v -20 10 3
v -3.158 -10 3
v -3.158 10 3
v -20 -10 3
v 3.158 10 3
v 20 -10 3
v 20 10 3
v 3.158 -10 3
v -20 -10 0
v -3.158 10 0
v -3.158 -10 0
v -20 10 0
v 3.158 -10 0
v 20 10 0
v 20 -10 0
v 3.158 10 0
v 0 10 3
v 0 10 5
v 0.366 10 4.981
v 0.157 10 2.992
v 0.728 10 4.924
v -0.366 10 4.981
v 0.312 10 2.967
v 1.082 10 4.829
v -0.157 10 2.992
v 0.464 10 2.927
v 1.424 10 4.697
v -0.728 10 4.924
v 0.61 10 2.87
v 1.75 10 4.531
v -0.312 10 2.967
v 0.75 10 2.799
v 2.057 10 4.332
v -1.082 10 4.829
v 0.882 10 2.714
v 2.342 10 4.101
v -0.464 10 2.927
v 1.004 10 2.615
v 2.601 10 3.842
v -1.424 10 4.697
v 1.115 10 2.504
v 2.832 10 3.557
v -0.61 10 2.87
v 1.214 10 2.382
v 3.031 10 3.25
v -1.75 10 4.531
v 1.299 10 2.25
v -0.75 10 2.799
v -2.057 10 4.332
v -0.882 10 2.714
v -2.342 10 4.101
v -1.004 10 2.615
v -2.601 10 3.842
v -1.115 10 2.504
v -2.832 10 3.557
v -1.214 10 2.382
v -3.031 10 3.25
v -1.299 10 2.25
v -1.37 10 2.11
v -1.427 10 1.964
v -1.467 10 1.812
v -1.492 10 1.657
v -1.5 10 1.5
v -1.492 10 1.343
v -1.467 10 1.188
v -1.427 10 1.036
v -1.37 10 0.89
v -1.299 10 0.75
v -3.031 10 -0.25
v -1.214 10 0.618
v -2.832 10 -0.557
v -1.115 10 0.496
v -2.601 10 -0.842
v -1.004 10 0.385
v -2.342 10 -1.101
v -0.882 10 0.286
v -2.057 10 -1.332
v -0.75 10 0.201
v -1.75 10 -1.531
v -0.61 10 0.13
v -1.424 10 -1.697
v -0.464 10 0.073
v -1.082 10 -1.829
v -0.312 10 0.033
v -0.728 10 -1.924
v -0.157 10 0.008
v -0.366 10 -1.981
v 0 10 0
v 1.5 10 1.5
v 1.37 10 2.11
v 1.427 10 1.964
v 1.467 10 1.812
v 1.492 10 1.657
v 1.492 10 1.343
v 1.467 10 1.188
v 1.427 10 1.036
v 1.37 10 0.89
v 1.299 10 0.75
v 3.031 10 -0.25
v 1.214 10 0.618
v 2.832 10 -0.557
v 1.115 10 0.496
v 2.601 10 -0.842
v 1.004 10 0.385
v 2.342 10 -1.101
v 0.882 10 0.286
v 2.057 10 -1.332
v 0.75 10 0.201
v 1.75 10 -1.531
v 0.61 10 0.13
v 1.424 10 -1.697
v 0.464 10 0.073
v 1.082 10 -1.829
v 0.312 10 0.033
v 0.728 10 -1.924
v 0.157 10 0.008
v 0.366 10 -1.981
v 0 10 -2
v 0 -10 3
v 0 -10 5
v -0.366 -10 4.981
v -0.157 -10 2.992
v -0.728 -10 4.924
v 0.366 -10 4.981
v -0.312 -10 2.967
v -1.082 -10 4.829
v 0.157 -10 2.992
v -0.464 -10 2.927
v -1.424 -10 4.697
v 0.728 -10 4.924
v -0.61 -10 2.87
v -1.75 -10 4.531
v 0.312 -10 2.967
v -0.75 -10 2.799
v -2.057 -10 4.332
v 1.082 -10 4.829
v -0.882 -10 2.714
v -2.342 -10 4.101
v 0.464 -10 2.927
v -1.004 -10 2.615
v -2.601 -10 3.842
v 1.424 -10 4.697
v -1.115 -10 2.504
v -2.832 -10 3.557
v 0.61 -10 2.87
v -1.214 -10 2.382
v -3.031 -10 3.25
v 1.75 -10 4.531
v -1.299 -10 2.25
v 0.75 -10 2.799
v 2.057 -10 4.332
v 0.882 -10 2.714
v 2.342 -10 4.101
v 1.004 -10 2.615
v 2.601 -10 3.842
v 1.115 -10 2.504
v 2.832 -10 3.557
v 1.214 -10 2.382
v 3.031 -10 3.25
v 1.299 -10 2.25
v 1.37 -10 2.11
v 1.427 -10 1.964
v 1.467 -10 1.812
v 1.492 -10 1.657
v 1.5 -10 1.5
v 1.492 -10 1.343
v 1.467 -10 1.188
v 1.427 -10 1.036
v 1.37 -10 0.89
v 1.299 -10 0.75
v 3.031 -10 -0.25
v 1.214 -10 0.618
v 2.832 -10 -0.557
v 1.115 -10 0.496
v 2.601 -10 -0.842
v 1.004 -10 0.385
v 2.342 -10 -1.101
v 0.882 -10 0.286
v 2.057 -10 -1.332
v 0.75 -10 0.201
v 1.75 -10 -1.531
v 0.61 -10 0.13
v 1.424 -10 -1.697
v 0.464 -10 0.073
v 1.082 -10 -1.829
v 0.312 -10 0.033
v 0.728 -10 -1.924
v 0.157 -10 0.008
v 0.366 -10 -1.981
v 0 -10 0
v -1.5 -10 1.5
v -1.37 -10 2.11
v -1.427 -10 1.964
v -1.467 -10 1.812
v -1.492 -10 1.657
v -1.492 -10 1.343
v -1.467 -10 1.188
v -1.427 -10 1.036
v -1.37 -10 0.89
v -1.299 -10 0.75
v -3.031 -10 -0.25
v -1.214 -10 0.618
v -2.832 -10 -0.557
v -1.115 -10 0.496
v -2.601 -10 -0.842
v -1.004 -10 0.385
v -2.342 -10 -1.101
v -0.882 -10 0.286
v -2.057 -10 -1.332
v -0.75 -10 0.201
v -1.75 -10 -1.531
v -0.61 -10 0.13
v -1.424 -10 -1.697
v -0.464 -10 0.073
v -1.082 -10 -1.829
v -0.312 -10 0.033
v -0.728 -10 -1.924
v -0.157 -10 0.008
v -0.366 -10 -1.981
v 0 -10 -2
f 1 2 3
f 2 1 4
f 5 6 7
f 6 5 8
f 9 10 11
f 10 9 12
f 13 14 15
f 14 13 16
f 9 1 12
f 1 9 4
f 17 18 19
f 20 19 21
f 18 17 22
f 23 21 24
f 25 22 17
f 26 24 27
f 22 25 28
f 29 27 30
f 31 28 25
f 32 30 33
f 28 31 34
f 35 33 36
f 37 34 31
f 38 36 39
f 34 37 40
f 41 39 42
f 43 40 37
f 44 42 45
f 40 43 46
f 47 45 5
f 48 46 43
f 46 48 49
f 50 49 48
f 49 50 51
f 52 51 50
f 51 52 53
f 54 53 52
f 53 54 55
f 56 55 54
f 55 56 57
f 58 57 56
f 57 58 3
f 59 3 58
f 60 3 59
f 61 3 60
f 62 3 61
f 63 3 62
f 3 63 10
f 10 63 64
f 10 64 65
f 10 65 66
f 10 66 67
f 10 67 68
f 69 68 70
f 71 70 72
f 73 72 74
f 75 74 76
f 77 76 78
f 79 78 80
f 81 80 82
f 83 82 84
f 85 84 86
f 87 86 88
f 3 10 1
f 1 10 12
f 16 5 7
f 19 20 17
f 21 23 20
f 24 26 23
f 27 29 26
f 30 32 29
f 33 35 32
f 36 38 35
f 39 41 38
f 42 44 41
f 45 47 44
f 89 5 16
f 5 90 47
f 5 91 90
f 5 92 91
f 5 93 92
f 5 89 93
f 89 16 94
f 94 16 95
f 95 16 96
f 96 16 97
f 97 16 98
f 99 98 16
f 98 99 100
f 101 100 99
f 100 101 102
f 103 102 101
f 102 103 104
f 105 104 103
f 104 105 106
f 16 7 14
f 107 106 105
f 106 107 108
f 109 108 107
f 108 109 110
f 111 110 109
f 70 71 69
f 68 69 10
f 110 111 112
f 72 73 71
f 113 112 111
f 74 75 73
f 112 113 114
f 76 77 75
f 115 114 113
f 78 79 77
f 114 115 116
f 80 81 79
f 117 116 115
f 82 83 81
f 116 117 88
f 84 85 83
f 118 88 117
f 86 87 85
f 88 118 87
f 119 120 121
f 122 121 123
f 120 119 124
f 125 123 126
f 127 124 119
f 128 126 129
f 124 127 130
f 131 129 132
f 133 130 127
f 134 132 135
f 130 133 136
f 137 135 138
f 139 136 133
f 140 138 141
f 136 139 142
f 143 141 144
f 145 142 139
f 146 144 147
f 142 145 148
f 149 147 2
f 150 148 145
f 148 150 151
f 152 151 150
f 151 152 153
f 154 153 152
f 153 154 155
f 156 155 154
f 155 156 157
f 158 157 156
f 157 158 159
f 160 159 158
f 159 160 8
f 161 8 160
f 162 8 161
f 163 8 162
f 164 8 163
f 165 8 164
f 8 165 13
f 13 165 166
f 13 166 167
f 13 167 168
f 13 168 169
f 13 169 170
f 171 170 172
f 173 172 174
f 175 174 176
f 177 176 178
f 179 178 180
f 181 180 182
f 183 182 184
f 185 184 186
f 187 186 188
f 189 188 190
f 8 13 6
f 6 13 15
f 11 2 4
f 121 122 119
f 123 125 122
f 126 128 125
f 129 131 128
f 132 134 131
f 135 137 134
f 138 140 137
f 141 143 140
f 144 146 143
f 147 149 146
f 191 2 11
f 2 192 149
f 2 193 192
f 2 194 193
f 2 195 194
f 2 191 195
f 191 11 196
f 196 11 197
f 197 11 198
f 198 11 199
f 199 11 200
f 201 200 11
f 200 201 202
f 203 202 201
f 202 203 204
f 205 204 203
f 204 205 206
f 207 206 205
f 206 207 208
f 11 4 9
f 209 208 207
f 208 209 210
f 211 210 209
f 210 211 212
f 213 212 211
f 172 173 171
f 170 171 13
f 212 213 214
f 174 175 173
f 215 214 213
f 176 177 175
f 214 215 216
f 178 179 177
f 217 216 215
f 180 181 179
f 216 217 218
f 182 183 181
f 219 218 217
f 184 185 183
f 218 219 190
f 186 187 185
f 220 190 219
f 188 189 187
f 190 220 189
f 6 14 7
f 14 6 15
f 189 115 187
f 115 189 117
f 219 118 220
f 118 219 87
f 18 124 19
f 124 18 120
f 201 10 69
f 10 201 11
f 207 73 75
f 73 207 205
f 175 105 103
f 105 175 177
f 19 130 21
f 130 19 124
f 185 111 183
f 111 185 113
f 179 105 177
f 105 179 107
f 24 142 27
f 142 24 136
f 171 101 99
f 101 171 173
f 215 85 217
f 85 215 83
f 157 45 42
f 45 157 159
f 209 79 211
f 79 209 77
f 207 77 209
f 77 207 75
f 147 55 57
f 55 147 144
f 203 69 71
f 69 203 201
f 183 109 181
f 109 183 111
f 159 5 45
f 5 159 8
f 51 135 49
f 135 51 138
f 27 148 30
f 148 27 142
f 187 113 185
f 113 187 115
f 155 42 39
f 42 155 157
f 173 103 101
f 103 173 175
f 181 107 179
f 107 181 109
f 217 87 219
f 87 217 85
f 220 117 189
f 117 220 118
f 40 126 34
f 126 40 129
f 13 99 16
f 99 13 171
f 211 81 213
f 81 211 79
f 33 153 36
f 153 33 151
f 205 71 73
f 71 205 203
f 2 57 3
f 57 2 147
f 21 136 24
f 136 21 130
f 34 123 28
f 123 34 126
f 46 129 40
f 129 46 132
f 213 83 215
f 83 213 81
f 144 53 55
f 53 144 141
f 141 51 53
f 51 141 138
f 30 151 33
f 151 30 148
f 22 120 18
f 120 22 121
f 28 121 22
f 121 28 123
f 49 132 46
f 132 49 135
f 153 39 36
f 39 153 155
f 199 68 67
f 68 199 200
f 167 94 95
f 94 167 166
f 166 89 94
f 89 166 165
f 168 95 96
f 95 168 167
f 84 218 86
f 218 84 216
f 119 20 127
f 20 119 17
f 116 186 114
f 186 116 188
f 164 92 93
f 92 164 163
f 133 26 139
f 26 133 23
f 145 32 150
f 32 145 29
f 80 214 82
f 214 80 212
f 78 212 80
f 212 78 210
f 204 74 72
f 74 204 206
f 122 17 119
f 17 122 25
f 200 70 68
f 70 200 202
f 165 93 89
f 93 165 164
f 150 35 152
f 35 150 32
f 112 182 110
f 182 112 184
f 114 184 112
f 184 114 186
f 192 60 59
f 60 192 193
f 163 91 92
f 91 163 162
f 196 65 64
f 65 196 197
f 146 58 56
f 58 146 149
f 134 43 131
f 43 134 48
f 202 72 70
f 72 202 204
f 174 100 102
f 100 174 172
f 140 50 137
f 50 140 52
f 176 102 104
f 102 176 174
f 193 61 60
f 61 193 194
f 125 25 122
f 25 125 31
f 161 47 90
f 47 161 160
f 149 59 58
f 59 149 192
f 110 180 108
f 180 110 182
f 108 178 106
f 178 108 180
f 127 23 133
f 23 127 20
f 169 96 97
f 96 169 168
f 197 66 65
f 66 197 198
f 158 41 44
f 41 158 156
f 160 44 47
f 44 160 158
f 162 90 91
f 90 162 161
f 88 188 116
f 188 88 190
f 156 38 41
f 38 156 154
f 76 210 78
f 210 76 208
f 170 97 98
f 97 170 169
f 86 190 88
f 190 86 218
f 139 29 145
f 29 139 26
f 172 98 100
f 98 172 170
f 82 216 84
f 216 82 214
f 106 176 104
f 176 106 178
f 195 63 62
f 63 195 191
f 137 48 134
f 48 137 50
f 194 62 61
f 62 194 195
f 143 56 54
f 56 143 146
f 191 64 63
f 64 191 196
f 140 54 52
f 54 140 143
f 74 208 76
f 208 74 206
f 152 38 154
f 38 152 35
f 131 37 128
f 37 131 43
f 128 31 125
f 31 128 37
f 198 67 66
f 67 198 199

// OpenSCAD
// Compact plate hinge.
$fn = 60;
eps = 0.02;
leaf_l = 20;
width = 20;
pin_d = 3;
leaf_t = 3;
difference() {
    union() {
        translate([-leaf_l,-width/2,0]) cube([leaf_l,width,leaf_t]);
        translate([0,-width/2,0]) cube([leaf_l,width,leaf_t]);
        translate([0,-width/2,leaf_t/2]) rotate([-90,0,0]) cylinder(d=pin_d+4,h=width);
    }
    translate([0,-width/2-eps,leaf_t/2]) rotate([-90,0,0]) cylinder(d=pin_d,h=width+2*eps);
}
